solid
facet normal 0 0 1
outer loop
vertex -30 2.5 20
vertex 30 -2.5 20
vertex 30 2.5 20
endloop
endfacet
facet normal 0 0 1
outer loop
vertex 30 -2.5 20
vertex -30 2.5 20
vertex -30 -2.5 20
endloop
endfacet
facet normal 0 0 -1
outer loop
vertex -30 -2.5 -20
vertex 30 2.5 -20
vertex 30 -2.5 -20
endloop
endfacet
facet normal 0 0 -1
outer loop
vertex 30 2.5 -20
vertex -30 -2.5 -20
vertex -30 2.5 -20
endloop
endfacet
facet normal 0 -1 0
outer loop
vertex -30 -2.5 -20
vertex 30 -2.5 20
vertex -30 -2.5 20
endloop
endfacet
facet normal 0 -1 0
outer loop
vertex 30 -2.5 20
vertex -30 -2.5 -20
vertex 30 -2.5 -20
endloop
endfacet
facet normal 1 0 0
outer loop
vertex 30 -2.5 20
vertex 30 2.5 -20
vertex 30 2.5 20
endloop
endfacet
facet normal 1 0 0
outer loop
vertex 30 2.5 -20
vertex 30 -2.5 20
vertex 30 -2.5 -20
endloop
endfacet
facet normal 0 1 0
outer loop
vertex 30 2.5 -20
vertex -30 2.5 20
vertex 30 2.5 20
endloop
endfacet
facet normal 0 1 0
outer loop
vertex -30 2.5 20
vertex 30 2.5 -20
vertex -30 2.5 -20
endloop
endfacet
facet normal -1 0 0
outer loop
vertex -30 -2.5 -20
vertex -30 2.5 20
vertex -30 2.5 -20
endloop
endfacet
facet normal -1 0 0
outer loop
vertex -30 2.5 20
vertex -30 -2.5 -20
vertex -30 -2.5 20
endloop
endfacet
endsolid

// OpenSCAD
// file: screw.scad
module screw(thickness,deep, radius){
	union(){
			cylinder(deep,radius,radius,false);
			cylinder(thickness,2*radius,radius,false);
	}
};

screw(3,10,2.5);
// main file
use <./screw.scad>;

module background(height,width,thickness){
	cube([width,thickness,height],true);
}

background(40,60,5);
